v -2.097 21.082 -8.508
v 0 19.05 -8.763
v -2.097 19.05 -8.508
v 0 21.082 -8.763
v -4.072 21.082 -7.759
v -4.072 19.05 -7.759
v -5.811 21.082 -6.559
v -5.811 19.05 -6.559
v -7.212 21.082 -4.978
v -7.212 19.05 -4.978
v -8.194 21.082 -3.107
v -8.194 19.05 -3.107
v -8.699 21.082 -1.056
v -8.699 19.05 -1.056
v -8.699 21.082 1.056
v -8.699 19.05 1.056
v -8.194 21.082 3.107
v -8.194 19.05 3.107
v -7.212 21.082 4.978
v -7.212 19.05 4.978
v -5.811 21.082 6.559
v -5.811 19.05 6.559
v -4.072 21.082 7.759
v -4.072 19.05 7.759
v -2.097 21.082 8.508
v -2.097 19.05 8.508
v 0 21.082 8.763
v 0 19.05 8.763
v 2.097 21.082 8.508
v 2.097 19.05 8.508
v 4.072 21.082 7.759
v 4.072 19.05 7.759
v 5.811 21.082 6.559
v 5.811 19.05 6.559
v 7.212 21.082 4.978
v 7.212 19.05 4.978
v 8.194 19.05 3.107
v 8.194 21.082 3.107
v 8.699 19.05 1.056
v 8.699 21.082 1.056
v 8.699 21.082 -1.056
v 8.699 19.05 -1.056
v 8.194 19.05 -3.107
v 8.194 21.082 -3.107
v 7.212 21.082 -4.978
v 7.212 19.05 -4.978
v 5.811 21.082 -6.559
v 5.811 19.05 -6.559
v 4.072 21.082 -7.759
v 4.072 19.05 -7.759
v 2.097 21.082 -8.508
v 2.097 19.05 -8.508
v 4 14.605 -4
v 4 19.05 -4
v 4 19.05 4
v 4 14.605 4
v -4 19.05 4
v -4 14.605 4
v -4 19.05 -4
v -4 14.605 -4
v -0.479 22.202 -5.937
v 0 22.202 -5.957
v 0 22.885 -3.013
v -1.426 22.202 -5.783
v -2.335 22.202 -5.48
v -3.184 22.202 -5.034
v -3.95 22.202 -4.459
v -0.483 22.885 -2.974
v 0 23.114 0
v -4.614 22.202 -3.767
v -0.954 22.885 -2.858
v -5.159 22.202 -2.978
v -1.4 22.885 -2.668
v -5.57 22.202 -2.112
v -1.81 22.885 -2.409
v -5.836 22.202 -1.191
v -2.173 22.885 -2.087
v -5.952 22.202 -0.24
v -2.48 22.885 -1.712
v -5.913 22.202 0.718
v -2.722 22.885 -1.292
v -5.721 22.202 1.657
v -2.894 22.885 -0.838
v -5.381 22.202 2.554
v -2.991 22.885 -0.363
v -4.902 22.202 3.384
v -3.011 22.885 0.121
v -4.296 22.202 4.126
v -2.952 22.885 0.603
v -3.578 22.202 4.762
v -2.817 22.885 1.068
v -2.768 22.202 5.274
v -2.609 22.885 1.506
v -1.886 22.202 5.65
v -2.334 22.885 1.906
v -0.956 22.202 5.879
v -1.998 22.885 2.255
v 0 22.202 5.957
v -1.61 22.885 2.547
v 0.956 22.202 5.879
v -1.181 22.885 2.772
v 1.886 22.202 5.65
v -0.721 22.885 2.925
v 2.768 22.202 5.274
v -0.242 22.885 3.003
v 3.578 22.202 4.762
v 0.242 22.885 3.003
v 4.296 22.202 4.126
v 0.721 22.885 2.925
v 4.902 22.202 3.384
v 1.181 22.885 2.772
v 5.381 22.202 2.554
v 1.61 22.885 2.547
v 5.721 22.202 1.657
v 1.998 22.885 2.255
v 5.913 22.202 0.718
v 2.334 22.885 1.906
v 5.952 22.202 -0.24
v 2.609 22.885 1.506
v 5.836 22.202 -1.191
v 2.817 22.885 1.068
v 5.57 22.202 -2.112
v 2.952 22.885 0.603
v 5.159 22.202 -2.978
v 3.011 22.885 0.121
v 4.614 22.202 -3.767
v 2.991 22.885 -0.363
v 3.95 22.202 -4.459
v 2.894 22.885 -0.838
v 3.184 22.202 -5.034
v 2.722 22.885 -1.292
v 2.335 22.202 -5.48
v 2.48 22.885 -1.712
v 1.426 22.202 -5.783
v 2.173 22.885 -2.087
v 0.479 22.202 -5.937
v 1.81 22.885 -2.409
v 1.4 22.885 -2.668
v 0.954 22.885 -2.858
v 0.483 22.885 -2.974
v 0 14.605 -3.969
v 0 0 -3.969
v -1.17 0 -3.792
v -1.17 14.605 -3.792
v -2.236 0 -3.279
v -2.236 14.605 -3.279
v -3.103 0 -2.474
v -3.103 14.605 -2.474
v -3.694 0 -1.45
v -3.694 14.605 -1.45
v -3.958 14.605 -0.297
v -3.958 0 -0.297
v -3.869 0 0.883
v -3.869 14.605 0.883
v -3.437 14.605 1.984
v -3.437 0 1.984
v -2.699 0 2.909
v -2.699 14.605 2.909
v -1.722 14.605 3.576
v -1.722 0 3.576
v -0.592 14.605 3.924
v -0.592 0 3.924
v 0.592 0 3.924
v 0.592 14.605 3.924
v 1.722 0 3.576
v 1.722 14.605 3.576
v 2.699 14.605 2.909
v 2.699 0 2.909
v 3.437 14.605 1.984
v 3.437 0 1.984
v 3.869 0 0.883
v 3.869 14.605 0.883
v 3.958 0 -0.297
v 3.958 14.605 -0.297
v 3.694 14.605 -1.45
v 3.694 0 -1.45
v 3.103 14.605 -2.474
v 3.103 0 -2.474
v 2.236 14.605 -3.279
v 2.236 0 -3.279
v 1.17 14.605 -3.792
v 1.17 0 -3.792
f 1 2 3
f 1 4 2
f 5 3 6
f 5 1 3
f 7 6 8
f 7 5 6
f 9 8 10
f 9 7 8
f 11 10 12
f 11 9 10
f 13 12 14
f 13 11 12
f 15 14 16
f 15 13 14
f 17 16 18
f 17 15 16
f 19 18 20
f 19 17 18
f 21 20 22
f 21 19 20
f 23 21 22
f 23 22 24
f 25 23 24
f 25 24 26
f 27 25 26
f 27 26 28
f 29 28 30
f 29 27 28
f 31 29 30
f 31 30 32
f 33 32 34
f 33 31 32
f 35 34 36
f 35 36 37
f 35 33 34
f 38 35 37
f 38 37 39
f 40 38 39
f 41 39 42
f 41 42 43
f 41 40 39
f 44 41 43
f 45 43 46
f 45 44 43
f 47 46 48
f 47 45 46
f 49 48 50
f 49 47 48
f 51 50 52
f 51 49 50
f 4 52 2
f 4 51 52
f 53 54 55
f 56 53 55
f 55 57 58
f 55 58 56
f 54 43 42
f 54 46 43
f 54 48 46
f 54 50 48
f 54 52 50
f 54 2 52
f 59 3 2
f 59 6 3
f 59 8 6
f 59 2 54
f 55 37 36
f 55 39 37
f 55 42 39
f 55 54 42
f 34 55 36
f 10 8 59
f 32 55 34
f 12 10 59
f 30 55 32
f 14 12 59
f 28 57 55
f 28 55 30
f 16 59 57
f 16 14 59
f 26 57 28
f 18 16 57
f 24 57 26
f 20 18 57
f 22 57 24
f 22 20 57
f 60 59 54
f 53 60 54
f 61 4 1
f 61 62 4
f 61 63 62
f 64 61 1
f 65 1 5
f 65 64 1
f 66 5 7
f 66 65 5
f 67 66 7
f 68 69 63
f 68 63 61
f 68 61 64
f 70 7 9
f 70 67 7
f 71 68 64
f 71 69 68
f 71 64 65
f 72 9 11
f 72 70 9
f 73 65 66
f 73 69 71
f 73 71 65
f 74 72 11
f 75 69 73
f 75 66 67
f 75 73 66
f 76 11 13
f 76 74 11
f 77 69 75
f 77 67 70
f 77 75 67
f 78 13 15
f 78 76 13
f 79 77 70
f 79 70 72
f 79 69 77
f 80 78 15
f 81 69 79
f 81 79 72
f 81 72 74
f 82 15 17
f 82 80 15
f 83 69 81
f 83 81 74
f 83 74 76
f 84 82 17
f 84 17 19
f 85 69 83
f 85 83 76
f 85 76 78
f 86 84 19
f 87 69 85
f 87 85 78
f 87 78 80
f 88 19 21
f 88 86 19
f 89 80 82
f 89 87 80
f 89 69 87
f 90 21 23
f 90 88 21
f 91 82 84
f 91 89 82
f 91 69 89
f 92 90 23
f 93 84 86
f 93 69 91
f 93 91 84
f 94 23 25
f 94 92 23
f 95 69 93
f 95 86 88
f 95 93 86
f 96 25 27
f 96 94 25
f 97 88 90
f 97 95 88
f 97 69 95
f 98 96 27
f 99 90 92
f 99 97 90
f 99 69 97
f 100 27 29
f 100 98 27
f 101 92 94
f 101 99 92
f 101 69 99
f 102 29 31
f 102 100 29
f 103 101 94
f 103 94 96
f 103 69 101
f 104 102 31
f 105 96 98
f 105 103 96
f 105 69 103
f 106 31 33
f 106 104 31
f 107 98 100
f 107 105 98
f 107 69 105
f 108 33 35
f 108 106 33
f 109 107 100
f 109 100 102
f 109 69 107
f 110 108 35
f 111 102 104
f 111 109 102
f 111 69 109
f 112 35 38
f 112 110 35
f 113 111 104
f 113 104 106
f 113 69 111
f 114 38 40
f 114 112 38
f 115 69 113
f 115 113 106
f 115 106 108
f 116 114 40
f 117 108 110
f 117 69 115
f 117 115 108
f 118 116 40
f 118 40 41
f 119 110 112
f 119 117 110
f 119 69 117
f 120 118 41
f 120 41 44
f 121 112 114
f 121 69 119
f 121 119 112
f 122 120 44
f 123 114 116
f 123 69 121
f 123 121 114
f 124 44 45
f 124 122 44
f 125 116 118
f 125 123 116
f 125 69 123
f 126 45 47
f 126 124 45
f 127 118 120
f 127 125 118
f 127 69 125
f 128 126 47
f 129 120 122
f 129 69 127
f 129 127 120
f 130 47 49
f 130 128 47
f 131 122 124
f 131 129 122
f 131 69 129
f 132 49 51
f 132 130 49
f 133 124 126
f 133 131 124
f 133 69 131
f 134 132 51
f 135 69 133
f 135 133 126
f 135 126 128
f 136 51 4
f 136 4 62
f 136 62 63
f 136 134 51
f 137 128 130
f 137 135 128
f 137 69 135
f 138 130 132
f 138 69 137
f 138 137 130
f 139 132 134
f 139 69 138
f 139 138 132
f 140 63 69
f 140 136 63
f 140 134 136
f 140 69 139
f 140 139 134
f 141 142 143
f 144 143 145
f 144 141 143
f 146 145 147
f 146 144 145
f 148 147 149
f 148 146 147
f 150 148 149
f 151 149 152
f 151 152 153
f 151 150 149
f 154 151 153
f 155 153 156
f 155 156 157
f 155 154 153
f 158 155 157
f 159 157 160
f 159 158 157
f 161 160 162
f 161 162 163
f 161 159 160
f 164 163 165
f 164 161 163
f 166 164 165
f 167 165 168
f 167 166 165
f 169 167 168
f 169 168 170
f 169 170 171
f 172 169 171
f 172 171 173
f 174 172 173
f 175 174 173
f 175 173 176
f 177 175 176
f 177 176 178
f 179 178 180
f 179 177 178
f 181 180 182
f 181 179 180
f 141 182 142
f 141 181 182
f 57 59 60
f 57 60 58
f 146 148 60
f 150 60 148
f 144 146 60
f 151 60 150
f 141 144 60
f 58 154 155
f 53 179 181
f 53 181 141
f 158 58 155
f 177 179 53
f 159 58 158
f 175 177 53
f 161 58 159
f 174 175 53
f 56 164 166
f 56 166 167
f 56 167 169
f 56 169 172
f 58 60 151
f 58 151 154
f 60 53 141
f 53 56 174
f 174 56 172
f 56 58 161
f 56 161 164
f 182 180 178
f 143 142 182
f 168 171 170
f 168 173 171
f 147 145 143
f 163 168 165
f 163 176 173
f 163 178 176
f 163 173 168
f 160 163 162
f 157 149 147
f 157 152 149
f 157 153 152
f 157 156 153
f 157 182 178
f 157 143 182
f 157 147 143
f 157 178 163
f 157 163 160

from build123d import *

# Parameters (mm, degrees)
SKETCH2_W         = 8.001
SKETCH2_H         = 8.001
SQUARE_BOSS_DEPTH = 4.445


with BuildPart() as part:
    # Sketch1 → Screw revolve (revolve)
    with BuildSketch(Plane.XY, mode=Mode.PRIVATE) as screw_revolve_sk:
        with BuildLine():
            Line((0, 0), (3.96875, 0))
            Line((3.96875, 0), (3.96875, 19.05))
            Line((3.96875, 19.05), (8.763, 19.05))
            Line((8.763, 19.05), (8.763, 21.082))
            ThreePointArc((8.763, 21.082), (4.497754801, 22.599348829), (0, 23.114))
            Line((0, 23.114), (0, 0))
        make_face()
    revolve(screw_revolve_sk.sketch.rotate(Axis((0, 0, 0), (0, 1, 0)), 90), axis=Axis((0, 0, 0), (0, 1, 0)))

    # Sketch2 → Square boss (add)
    with BuildSketch(Plane.XZ.offset(-19.05)):
        Rectangle(SKETCH2_W, SKETCH2_H)
    extrude(amount=SQUARE_BOSS_DEPTH)


solid = part.part
